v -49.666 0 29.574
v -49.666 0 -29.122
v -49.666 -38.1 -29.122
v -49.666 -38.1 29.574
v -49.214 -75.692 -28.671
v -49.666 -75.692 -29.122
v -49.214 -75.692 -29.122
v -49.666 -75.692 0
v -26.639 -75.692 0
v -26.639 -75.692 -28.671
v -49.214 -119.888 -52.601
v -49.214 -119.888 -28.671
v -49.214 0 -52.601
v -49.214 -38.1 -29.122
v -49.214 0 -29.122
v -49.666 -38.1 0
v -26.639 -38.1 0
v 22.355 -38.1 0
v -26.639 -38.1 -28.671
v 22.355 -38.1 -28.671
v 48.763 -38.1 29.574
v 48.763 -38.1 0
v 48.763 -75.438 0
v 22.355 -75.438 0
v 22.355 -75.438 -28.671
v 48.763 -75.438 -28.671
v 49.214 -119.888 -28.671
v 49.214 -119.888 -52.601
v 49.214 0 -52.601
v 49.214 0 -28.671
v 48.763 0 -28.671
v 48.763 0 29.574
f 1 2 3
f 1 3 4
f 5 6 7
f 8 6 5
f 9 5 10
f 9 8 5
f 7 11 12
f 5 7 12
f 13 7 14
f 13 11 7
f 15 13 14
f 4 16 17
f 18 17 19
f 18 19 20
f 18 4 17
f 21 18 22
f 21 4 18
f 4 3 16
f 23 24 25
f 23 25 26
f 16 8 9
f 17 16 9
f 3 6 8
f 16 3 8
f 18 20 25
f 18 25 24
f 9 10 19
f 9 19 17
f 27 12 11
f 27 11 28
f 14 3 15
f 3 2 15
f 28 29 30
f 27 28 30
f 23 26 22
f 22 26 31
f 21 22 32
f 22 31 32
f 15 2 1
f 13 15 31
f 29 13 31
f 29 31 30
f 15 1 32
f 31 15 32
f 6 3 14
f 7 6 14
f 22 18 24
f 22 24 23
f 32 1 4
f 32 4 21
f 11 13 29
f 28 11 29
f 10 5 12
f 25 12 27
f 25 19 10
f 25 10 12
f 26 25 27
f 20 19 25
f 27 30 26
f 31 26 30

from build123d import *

# Parameters (mm, degrees)
F0_W     = 98.428418
F0_H     = 58.695849
F1_DEPTH = 38.1
F2_W     = 23.026837
F2_H     = 29.122172
F3_DEPTH = 37.592
F4_W     = 26.407606
F4_H     = 29.122172
F5_DEPTH = 37.338
F6_W     = 98.428428
F6_H     = 23.929847
F7_DEPTH = 119.888


with BuildPart() as f1:
    # F0 (on Front) → F1 (new body)
    with BuildSketch(Plane.XZ):
        with Locations((-0.45151, 0.225753)):
            Rectangle(F0_W, F0_H)
    extrude(amount=F1_DEPTH)

    # F2 (on face) → F3 (join)
    with BuildSketch(Plane.XZ.offset(38.1)):
        with Locations((-38.1523, -14.561086)):
            Rectangle(F2_W, F2_H)
    extrude(amount=F3_DEPTH)

    # F4 (on face) → F5 (join)
    with BuildSketch(Plane.XZ.offset(38.1)):
        with Locations((35.558896, -14.561086)):
            Rectangle(F4_W, F4_H)
    extrude(amount=F5_DEPTH)

    # F6 (on Front) → F7 (join)
    with BuildSketch(Plane.XZ):
        with Locations((4e-06, -40.635587)):
            Rectangle(F6_W, F6_H)
    extrude(amount=F7_DEPTH)


solid = f1.part
